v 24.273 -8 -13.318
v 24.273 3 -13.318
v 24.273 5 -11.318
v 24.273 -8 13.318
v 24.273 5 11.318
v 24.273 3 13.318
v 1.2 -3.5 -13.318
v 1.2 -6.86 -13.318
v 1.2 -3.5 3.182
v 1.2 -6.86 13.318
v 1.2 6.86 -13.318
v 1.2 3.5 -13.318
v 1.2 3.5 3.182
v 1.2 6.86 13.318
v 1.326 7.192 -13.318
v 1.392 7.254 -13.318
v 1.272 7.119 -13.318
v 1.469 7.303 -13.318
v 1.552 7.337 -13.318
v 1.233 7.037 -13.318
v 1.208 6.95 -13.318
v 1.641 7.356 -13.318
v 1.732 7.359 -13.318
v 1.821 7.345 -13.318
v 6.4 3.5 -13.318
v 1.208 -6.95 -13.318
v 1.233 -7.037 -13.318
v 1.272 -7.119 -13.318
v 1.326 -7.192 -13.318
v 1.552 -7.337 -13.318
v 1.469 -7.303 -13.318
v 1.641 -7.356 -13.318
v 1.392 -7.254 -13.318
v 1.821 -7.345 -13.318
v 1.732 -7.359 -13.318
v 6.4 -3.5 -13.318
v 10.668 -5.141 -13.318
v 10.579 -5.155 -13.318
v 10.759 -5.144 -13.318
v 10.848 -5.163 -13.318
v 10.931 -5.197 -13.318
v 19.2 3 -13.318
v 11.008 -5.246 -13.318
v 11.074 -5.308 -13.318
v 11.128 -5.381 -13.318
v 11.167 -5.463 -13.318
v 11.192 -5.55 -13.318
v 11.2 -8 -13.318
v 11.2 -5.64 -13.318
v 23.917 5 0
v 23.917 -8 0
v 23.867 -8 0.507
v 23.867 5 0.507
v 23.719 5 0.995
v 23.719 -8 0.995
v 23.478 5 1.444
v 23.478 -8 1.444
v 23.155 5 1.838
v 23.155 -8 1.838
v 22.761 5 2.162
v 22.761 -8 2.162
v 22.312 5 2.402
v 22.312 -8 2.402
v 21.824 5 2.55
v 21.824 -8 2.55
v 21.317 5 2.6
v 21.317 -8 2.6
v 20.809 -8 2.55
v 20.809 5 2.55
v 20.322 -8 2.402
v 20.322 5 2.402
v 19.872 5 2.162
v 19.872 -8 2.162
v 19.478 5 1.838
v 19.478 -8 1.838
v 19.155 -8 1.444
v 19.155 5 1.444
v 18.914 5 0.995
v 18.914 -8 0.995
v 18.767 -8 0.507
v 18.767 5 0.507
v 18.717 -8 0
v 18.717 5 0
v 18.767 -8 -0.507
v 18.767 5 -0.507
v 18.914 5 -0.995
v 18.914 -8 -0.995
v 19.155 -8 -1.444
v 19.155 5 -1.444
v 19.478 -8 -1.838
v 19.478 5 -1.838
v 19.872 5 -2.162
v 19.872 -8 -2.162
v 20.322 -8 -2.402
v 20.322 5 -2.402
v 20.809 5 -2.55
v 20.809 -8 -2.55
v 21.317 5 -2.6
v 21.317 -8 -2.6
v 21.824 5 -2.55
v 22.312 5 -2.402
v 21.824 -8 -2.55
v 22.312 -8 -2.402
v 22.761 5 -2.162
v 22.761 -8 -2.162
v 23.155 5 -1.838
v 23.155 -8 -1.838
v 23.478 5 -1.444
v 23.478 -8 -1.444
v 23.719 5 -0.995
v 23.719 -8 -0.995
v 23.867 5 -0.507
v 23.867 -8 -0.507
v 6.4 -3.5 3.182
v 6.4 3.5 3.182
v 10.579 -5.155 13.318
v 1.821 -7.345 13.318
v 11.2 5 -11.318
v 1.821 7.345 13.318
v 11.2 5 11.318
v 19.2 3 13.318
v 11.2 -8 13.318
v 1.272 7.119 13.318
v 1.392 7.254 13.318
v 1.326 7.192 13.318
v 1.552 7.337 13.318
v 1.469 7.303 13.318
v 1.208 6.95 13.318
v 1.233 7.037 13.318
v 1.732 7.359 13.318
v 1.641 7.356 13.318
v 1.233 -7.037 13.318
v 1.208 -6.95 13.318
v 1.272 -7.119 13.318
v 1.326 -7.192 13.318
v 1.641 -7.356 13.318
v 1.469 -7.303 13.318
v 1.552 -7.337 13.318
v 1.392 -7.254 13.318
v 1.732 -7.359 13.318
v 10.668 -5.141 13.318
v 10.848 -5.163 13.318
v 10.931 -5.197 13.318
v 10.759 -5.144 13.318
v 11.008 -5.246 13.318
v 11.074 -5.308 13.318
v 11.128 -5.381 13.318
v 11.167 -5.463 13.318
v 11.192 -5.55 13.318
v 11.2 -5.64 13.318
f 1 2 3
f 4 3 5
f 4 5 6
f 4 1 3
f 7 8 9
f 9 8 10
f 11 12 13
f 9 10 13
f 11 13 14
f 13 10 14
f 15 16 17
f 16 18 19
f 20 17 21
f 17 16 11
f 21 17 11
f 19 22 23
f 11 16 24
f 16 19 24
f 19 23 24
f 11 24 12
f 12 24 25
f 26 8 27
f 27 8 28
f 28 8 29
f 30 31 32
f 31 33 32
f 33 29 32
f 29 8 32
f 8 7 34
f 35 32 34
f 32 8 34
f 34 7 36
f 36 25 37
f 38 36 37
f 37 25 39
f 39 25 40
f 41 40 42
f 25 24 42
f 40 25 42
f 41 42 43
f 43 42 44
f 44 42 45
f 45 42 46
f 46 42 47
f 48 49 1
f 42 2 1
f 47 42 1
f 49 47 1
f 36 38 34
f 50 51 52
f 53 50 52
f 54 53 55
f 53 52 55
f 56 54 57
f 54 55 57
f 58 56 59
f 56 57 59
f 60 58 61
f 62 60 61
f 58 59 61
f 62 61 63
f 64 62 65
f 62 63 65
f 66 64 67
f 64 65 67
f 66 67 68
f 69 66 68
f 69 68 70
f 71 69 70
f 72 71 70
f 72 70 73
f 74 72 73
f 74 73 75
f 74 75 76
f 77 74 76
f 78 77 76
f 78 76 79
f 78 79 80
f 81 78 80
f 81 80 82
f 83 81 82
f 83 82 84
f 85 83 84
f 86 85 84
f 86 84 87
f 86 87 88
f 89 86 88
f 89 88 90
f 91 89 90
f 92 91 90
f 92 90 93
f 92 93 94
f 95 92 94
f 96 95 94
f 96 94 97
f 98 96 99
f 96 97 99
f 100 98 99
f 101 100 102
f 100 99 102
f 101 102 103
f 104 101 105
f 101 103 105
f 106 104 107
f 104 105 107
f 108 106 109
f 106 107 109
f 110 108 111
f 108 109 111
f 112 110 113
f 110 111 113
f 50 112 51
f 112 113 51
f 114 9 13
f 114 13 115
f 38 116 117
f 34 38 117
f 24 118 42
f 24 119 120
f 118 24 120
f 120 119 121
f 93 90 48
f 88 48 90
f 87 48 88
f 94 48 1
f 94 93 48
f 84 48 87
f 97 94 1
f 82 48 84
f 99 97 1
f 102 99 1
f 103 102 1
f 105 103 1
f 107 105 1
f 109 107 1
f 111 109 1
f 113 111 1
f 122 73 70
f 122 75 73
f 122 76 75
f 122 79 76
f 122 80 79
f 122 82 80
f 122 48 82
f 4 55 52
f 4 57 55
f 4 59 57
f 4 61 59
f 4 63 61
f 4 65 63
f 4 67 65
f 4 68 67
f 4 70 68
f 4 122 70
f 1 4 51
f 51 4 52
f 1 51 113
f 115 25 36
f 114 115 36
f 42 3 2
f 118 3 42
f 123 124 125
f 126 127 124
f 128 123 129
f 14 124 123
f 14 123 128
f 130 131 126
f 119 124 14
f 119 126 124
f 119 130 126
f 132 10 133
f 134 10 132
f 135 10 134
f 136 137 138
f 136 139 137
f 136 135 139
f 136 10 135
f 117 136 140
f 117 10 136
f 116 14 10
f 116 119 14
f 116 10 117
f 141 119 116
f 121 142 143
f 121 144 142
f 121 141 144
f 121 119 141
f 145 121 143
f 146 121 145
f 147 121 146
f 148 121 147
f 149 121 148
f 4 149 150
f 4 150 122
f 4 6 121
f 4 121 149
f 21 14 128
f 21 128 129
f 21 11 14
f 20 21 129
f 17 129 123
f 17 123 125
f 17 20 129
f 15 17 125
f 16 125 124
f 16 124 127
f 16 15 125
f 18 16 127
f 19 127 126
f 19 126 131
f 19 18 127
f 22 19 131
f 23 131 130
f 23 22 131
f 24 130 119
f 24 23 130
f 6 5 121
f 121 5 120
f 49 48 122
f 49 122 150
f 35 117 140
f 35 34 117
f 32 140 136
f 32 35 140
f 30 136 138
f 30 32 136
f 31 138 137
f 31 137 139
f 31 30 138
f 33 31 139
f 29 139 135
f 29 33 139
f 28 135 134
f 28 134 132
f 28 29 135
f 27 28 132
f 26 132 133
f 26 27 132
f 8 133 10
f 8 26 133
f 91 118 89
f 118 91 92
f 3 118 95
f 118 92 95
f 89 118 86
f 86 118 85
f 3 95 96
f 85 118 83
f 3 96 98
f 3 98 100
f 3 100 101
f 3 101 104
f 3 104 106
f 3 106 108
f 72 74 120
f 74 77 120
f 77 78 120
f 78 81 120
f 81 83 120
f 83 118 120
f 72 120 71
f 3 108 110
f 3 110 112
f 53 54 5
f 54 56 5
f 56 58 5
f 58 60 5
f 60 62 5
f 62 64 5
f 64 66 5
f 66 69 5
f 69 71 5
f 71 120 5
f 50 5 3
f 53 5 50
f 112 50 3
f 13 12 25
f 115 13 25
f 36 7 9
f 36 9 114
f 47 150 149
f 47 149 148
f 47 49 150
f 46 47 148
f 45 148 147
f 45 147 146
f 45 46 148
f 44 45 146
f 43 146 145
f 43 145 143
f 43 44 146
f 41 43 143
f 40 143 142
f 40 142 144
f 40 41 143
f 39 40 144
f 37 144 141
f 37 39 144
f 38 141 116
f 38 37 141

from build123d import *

# Parameters (mm, degrees)
SKETCH002_W     = 24.115805
SKETCH002_H     = 45
PAD001_DEPTH    = 8
POCKET001_DEPTH = 45.001
SKETCH004_W     = 9.473238
SKETCH004_H     = 26.16662
SKETCH004_W_2   = 10.488205
SKETCH004_H_2   = 27.344377
POCKET002_DEPTH = 23.073659
SKETCH005_R     = 2.6
POCKET003_DEPTH = 15.501
CHAMFER_SIZE    = 2
SKETCH007_W     = 5.2
SKETCH007_H     = 7
POCKET004_DEPTH = 16.5
FILLET_R        = 0.5


with BuildPart() as part:
    # Sketch002 → Pad001 (new body, symmetric)
    with BuildSketch(Plane.XZ):
        with Locations((12.214756, 0)):
            Rectangle(SKETCH002_W, SKETCH002_H)
    extrude(amount=PAD001_DEPTH, both=True)

    # Sketch003 (on Face1 of Pad001) → Pocket001 (cut, through all)
    with BuildSketch(Plane(origin=(0, 0, 22.5), x_dir=(-1, 0, 0), z_dir=(0, 0, 1))):
        Polygon((-1.2, 7.5), (-1.2, -7.5), (-11.2, -5), (-26.098127, -5), (-26.098127, -10.333512), (0.566555, -10.333512), (0.566555, 8.419309), (-11.2, 8.419309), (-11.2, 5), align=None)
    extrude(amount=-POCKET001_DEPTH, mode=Mode.SUBTRACT)

    # Sketch004 (on Face8 of Pocket001) → Pocket002 (cut, through all)
    with BuildSketch(Plane(origin=(24.272659, 0, 0), x_dir=(0, 0, 1), z_dir=(1, 0, 0))):
        with Locations((-18.054942, -4.322038)):
            Rectangle(SKETCH004_W, SKETCH004_H)
        with Locations((18.562425, -4.910916)):
            Rectangle(SKETCH004_W_2, SKETCH004_H_2)
    extrude(amount=-POCKET002_DEPTH, mode=Mode.SUBTRACT)

    # Sketch005 (on Face6 of Pocket002) → Pocket003 (cut, through all)
    with BuildSketch(Plane.XZ.offset(8)):
        with Locations((21.316544, 0)):
            Circle(SKETCH005_R)
    extrude(amount=-POCKET003_DEPTH, mode=Mode.SUBTRACT)

    # Chamfer
    chamfer_edges = [part.edges().sort_by_distance(p)[0] for p in [
        (17.73633, 5, -13.318323),
        (17.73633, 5, 13.318323),
    ]]
    chamfer(chamfer_edges, length=CHAMFER_SIZE)

    # Sketch007 (on Face7 of Chamfer) → Pocket004 (cut)
    with BuildSketch(Plane(origin=(0, 0, -13.318323), x_dir=(1, 0, 0), z_dir=(0, 0, -1))):
        with Locations((3.8, 0)):
            Rectangle(SKETCH007_W, SKETCH007_H)
    extrude(amount=-POCKET004_DEPTH, mode=Mode.SUBTRACT)

    # Fillet
    fillet_edges = [part.edges().sort_by_distance(p)[0] for p in [
        (1.2, -7.5, 0),
        (1.2, 7.5, 0),
        (11.2, -5, 0),
    ]]
    fillet(fillet_edges, radius=FILLET_R)


solid = part.part
